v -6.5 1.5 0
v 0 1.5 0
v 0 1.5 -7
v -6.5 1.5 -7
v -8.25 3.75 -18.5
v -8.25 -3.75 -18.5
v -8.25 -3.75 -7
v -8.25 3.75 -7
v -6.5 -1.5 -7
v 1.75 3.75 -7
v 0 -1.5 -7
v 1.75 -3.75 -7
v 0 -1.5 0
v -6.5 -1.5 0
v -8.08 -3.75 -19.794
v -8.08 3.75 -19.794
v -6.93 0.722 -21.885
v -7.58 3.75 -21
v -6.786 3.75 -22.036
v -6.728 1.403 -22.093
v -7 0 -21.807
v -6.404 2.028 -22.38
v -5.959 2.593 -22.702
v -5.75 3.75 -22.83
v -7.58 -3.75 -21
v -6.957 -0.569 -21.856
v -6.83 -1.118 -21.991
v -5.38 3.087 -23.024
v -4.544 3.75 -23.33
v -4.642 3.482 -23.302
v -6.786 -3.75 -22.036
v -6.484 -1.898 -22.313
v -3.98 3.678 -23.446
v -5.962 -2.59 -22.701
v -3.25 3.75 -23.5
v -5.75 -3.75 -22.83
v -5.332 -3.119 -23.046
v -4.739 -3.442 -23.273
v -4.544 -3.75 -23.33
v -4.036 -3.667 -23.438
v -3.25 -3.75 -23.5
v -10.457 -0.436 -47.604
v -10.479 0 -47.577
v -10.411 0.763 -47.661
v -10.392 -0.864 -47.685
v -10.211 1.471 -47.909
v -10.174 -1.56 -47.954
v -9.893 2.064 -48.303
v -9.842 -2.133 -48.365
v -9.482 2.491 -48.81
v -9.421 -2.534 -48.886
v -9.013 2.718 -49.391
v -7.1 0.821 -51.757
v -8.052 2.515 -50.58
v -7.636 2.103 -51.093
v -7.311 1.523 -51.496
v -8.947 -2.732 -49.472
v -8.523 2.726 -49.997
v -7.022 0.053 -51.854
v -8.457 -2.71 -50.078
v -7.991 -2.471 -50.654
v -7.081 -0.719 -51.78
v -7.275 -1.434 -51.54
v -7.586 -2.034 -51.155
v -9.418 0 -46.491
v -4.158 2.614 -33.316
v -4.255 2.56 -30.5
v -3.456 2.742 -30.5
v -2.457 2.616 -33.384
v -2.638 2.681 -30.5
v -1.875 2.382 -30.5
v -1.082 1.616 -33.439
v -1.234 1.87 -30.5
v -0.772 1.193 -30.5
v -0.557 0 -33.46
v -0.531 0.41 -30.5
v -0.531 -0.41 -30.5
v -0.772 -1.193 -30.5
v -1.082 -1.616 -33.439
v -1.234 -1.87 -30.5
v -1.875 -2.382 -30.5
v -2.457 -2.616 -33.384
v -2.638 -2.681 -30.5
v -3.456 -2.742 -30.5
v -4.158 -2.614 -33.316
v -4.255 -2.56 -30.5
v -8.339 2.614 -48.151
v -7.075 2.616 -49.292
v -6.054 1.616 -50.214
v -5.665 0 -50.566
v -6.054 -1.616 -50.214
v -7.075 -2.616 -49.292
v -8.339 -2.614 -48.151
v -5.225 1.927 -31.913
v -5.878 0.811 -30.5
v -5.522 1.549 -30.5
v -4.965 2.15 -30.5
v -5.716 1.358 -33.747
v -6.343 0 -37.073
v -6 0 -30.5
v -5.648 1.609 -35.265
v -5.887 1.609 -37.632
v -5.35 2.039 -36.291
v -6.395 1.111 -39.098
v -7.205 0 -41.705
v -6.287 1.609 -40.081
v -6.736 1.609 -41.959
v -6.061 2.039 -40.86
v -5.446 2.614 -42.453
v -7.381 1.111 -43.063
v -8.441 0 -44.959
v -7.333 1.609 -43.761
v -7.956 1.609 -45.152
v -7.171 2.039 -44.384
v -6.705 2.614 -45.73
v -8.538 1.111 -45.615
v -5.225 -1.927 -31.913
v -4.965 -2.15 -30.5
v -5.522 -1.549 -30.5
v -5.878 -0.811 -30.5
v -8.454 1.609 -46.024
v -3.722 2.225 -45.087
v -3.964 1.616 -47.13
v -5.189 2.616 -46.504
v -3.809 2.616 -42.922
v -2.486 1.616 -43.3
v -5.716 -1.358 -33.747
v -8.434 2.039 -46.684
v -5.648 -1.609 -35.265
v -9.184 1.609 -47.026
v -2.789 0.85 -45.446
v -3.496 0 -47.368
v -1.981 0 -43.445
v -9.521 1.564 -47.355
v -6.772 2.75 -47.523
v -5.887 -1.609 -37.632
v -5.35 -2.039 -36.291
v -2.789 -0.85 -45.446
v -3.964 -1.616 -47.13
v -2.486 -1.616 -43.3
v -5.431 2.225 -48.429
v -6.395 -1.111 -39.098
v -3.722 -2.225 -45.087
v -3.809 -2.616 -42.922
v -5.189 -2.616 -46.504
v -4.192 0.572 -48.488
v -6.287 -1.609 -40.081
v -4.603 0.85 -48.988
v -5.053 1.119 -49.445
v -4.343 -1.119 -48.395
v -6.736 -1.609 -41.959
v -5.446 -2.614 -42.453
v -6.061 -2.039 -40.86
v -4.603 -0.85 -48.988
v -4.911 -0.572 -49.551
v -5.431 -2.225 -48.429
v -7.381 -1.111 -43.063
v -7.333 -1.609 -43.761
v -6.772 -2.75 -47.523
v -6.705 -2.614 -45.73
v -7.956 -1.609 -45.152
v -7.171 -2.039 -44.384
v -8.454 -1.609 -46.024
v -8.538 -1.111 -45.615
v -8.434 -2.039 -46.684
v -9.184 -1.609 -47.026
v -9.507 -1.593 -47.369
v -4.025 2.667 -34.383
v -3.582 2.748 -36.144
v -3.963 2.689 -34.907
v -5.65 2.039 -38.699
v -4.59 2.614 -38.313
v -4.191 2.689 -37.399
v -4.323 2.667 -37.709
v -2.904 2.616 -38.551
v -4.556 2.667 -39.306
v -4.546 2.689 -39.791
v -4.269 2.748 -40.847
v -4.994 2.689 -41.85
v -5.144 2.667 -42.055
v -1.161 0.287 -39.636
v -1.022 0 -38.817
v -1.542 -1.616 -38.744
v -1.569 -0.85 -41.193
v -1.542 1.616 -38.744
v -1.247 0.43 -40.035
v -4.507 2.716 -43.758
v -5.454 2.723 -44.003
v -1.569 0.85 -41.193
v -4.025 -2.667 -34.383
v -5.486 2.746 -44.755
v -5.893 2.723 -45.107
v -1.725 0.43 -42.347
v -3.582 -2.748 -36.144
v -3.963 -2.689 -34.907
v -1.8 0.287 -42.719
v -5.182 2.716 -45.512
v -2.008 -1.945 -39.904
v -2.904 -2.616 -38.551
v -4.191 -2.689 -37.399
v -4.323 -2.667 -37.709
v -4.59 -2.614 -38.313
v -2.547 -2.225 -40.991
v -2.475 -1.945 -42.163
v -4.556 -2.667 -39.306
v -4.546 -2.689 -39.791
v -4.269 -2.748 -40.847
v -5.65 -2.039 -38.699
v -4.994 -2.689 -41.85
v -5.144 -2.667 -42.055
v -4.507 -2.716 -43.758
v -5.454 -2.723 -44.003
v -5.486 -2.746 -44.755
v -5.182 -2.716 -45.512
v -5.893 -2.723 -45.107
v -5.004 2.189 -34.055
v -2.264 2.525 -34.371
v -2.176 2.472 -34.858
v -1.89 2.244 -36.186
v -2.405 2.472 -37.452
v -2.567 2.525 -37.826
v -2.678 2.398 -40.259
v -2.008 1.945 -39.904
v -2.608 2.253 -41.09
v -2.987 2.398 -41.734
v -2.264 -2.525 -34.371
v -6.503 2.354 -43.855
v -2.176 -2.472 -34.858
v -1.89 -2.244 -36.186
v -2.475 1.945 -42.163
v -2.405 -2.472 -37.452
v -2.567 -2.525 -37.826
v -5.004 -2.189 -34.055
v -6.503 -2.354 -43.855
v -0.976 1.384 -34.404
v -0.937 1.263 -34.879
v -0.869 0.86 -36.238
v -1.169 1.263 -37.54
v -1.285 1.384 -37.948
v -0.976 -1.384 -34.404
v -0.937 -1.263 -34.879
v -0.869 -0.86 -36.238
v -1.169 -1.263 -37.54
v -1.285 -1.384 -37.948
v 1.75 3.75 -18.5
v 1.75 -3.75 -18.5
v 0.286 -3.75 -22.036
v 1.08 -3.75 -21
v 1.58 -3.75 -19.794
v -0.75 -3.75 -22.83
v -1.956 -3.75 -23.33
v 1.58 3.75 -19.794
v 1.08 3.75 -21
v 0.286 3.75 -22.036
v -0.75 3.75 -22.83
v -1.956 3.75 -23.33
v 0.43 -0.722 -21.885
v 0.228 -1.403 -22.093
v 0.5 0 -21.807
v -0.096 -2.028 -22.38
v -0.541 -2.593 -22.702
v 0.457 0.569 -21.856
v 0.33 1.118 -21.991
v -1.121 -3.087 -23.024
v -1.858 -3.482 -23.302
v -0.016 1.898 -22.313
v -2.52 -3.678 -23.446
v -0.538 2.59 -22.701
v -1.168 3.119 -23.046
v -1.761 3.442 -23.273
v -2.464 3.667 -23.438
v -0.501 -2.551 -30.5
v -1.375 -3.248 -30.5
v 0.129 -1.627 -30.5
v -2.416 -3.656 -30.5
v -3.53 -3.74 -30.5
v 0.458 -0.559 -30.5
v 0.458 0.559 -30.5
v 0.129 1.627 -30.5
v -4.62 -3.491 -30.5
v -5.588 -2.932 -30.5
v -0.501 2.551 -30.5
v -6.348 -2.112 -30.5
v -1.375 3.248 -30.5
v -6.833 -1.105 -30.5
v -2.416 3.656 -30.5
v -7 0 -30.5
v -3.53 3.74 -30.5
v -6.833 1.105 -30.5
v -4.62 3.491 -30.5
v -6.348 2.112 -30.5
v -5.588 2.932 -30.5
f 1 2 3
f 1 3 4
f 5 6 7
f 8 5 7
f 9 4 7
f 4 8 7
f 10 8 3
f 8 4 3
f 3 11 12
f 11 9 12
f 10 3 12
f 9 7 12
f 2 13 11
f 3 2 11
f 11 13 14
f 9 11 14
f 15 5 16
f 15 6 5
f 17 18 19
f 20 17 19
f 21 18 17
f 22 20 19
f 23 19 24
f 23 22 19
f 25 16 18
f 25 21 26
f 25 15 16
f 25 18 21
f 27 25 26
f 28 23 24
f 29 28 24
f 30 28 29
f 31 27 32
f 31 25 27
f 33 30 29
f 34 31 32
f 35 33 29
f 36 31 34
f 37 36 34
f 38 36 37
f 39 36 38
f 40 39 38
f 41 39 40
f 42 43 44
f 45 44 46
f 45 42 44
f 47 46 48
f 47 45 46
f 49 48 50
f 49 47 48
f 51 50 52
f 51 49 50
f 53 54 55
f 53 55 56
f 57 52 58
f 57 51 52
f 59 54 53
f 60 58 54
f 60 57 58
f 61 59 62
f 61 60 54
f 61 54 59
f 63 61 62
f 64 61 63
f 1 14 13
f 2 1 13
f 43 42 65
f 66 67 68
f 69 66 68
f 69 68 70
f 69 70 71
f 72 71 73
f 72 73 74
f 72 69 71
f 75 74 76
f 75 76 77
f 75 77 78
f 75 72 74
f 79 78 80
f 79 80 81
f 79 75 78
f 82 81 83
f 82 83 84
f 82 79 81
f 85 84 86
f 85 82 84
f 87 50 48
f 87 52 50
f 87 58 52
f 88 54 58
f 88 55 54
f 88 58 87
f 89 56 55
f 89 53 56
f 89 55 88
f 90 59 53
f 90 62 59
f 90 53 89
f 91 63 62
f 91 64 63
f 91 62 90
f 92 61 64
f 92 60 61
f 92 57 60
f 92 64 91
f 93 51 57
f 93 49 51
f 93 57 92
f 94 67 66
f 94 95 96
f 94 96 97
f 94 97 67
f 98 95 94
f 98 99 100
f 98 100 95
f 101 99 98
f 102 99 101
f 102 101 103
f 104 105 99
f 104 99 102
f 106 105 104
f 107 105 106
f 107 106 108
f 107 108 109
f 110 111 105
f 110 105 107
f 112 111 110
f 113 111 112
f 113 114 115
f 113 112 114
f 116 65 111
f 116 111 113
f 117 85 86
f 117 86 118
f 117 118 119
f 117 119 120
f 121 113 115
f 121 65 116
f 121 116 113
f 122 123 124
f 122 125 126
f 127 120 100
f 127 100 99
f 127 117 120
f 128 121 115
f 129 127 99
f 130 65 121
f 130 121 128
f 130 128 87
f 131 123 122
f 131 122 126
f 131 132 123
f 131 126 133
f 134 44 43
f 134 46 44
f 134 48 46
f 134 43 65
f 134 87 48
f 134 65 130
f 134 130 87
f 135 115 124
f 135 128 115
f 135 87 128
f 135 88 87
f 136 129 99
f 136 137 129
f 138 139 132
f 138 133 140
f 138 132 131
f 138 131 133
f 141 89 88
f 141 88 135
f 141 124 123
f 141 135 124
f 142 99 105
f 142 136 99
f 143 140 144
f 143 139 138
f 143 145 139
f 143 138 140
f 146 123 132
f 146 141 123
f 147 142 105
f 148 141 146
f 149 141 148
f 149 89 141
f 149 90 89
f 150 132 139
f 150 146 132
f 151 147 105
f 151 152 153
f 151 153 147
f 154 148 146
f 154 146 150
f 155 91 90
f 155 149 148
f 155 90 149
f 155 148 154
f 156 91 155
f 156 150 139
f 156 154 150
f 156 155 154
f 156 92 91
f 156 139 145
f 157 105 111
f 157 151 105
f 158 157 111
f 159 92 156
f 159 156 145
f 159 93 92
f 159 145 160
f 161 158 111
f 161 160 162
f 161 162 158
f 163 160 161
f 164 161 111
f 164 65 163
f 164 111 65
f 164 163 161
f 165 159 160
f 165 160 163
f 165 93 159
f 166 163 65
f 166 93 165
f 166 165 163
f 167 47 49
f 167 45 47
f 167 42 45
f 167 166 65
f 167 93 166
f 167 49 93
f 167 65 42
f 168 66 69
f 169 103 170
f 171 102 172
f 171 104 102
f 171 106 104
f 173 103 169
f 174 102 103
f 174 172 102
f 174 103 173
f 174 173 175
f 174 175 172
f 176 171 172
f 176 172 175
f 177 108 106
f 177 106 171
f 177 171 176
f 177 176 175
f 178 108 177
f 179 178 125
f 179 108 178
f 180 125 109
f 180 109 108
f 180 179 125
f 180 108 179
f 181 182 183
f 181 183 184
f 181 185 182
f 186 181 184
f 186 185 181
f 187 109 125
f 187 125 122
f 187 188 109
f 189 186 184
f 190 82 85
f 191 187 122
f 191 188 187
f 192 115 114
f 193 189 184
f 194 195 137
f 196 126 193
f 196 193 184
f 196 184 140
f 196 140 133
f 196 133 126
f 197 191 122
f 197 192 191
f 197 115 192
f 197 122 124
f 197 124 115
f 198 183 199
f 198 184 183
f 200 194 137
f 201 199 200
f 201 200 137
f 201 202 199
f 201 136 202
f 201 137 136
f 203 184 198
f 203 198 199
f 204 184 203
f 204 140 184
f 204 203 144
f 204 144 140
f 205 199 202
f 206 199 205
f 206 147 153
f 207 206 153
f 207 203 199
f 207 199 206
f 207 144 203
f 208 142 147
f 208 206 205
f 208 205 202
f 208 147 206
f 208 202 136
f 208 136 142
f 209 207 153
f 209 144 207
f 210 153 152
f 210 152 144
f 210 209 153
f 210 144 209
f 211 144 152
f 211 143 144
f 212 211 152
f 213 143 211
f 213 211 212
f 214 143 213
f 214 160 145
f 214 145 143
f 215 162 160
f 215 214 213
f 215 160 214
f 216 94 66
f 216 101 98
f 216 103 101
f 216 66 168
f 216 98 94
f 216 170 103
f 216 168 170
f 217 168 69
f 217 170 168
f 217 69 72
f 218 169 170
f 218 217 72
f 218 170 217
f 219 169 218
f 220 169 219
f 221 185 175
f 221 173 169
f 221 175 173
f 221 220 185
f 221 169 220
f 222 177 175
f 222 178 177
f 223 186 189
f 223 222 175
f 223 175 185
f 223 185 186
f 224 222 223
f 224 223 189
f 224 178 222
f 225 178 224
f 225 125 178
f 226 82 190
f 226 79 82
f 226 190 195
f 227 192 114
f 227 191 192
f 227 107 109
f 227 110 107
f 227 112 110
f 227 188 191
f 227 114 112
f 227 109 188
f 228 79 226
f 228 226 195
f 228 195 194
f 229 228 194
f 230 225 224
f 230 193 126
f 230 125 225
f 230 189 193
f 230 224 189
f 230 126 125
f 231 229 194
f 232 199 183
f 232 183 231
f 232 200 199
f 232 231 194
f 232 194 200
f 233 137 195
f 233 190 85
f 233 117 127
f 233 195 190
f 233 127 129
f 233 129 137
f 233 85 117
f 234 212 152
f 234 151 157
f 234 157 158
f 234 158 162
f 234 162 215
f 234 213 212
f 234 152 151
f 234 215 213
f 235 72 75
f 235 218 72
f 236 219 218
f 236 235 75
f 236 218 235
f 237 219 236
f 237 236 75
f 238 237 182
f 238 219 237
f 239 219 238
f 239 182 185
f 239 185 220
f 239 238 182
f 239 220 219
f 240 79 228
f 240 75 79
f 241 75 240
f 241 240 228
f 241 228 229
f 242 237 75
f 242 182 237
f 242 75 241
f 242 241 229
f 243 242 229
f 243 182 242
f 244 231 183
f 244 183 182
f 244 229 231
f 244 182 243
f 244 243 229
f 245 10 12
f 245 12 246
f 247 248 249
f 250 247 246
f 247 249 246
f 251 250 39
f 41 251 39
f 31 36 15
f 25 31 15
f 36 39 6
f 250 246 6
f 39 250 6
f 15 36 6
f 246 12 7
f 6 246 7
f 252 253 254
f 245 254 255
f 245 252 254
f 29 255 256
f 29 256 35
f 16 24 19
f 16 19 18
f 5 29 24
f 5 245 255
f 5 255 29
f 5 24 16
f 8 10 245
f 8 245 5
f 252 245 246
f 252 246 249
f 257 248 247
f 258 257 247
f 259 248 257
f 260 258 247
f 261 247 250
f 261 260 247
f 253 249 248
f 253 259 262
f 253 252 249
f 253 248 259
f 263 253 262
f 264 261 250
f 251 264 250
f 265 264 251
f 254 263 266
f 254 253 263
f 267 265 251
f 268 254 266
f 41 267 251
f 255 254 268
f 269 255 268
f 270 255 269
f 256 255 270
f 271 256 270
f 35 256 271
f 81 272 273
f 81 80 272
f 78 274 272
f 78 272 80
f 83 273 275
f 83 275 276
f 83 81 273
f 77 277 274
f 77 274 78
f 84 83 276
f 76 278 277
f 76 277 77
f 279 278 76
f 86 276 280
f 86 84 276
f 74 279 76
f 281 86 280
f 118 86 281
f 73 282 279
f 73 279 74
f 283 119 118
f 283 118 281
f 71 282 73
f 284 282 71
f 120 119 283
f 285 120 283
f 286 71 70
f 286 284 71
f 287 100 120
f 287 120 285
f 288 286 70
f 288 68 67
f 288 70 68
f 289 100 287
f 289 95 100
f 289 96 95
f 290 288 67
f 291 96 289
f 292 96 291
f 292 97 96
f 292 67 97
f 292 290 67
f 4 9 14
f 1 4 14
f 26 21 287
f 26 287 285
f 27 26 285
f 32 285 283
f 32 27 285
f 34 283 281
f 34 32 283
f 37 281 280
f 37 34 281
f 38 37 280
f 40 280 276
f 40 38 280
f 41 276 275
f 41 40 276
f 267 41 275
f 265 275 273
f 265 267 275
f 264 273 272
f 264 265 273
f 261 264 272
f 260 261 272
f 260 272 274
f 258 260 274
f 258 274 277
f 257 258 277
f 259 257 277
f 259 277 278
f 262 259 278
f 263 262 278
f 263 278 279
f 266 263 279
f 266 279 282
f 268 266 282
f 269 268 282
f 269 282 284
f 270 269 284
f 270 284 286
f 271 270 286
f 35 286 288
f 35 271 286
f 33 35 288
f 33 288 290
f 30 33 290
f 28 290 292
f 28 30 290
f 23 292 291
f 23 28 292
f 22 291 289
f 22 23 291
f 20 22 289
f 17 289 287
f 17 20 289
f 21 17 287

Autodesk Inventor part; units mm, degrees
ref_plane "YZ Plane" through (0, 0, 0) normal (1, 0, 0) x (0, 1, 0)
ref_plane "XZ Plane" through (0, 0, 0) normal (0, 1, 0) x (-1, 0, 0)
sketch "Sketch1" plane through (0, 0, 0) normal (0, 1, 0) x (-1, 0, 0)
  line L0 (8.25, -7) -> (-1.75, -7)
  line L1 (-1.75, -7) -> (-1.75, -18.5)
  line L2 (3.25, -23.5) -> (3.25, -23.5)
  line L3 (8.25, -18.5) -> (8.25, -7)
  line L4 (6.5, 0) -> (0, 0)
  line L5 (0, 0) -> (0, -7)
  line L6 (0, -7) -> (6.5, -7)
  line L7 (6.5, -7) -> (6.5, 0)
  line L8 (3.25, -4.5122) -> (3.25, -12.4364) construction
  arc A0 (3.25, -23.5) -> (8.25, -18.5) centre (3.25, -18.5) ccw
  arc A1 (-1.75, -18.5) -> (3.25, -23.5) centre (3.25, -18.5) ccw
  line L9 (3.25, -23.5) -> (3.25, -30.5)
  line L10 (3.25, -30.5) -> (3.25, -45.2683) construction
  line L11 (3.25, -45.2683) -> (8.7503, -49.7156) construction
  spline S0 degree 2 poles (3.25, -30.5) (3.25, -45.2683) (8.7503, -49.7156) knots 1 1 1 2 2 2
  point P0 (8.25, -23.5)
  dimension "d0" = 10
  dimension "d1" = 6.5
  dimension "d3" = 16.5
  dimension "d4" = 5
  dimension "d5" = 7
  dimension "d15" = 7
extrude "Extrusion1" add sketch "Sketch1" along normal mid plane 7.5 contours L3 A0 A1 L1 L0
extrude "Extrusion2" add sketch "Sketch1" along normal mid plane 3 contours L0 L5 L4 L7
ref_plane "Work Plane1" through (-3.25, 0, -23.5) normal (0, 0, -1) x (-1, 0, 0)
sketch "Sketch2" plane through (-3.25, 0, -23.5) normal (0, 0, -1) x (-1, 0, 0)
  circle A0 centre (0, 0) radius 3.75
  point P0 (-3.25, 0)
  dimension "d12" = 7.5
extrude "Extrusion3" add sketch "Sketch2" along normal blind 7 and the other way blind 2
sketch "Sketch3" plane through (-3.25, 0, -30.5) normal (0, 0, -1) x (-1, 0, 0)
  circle A0 centre (0, 0) radius 2.75
  point P0 (-3.25, 0)
  dimension "d18" = 5.5
sweep "Sweep1" add profiles "Sketch3" path "Sketch1" path curves L9 S0
properties part number "USB_cable"
